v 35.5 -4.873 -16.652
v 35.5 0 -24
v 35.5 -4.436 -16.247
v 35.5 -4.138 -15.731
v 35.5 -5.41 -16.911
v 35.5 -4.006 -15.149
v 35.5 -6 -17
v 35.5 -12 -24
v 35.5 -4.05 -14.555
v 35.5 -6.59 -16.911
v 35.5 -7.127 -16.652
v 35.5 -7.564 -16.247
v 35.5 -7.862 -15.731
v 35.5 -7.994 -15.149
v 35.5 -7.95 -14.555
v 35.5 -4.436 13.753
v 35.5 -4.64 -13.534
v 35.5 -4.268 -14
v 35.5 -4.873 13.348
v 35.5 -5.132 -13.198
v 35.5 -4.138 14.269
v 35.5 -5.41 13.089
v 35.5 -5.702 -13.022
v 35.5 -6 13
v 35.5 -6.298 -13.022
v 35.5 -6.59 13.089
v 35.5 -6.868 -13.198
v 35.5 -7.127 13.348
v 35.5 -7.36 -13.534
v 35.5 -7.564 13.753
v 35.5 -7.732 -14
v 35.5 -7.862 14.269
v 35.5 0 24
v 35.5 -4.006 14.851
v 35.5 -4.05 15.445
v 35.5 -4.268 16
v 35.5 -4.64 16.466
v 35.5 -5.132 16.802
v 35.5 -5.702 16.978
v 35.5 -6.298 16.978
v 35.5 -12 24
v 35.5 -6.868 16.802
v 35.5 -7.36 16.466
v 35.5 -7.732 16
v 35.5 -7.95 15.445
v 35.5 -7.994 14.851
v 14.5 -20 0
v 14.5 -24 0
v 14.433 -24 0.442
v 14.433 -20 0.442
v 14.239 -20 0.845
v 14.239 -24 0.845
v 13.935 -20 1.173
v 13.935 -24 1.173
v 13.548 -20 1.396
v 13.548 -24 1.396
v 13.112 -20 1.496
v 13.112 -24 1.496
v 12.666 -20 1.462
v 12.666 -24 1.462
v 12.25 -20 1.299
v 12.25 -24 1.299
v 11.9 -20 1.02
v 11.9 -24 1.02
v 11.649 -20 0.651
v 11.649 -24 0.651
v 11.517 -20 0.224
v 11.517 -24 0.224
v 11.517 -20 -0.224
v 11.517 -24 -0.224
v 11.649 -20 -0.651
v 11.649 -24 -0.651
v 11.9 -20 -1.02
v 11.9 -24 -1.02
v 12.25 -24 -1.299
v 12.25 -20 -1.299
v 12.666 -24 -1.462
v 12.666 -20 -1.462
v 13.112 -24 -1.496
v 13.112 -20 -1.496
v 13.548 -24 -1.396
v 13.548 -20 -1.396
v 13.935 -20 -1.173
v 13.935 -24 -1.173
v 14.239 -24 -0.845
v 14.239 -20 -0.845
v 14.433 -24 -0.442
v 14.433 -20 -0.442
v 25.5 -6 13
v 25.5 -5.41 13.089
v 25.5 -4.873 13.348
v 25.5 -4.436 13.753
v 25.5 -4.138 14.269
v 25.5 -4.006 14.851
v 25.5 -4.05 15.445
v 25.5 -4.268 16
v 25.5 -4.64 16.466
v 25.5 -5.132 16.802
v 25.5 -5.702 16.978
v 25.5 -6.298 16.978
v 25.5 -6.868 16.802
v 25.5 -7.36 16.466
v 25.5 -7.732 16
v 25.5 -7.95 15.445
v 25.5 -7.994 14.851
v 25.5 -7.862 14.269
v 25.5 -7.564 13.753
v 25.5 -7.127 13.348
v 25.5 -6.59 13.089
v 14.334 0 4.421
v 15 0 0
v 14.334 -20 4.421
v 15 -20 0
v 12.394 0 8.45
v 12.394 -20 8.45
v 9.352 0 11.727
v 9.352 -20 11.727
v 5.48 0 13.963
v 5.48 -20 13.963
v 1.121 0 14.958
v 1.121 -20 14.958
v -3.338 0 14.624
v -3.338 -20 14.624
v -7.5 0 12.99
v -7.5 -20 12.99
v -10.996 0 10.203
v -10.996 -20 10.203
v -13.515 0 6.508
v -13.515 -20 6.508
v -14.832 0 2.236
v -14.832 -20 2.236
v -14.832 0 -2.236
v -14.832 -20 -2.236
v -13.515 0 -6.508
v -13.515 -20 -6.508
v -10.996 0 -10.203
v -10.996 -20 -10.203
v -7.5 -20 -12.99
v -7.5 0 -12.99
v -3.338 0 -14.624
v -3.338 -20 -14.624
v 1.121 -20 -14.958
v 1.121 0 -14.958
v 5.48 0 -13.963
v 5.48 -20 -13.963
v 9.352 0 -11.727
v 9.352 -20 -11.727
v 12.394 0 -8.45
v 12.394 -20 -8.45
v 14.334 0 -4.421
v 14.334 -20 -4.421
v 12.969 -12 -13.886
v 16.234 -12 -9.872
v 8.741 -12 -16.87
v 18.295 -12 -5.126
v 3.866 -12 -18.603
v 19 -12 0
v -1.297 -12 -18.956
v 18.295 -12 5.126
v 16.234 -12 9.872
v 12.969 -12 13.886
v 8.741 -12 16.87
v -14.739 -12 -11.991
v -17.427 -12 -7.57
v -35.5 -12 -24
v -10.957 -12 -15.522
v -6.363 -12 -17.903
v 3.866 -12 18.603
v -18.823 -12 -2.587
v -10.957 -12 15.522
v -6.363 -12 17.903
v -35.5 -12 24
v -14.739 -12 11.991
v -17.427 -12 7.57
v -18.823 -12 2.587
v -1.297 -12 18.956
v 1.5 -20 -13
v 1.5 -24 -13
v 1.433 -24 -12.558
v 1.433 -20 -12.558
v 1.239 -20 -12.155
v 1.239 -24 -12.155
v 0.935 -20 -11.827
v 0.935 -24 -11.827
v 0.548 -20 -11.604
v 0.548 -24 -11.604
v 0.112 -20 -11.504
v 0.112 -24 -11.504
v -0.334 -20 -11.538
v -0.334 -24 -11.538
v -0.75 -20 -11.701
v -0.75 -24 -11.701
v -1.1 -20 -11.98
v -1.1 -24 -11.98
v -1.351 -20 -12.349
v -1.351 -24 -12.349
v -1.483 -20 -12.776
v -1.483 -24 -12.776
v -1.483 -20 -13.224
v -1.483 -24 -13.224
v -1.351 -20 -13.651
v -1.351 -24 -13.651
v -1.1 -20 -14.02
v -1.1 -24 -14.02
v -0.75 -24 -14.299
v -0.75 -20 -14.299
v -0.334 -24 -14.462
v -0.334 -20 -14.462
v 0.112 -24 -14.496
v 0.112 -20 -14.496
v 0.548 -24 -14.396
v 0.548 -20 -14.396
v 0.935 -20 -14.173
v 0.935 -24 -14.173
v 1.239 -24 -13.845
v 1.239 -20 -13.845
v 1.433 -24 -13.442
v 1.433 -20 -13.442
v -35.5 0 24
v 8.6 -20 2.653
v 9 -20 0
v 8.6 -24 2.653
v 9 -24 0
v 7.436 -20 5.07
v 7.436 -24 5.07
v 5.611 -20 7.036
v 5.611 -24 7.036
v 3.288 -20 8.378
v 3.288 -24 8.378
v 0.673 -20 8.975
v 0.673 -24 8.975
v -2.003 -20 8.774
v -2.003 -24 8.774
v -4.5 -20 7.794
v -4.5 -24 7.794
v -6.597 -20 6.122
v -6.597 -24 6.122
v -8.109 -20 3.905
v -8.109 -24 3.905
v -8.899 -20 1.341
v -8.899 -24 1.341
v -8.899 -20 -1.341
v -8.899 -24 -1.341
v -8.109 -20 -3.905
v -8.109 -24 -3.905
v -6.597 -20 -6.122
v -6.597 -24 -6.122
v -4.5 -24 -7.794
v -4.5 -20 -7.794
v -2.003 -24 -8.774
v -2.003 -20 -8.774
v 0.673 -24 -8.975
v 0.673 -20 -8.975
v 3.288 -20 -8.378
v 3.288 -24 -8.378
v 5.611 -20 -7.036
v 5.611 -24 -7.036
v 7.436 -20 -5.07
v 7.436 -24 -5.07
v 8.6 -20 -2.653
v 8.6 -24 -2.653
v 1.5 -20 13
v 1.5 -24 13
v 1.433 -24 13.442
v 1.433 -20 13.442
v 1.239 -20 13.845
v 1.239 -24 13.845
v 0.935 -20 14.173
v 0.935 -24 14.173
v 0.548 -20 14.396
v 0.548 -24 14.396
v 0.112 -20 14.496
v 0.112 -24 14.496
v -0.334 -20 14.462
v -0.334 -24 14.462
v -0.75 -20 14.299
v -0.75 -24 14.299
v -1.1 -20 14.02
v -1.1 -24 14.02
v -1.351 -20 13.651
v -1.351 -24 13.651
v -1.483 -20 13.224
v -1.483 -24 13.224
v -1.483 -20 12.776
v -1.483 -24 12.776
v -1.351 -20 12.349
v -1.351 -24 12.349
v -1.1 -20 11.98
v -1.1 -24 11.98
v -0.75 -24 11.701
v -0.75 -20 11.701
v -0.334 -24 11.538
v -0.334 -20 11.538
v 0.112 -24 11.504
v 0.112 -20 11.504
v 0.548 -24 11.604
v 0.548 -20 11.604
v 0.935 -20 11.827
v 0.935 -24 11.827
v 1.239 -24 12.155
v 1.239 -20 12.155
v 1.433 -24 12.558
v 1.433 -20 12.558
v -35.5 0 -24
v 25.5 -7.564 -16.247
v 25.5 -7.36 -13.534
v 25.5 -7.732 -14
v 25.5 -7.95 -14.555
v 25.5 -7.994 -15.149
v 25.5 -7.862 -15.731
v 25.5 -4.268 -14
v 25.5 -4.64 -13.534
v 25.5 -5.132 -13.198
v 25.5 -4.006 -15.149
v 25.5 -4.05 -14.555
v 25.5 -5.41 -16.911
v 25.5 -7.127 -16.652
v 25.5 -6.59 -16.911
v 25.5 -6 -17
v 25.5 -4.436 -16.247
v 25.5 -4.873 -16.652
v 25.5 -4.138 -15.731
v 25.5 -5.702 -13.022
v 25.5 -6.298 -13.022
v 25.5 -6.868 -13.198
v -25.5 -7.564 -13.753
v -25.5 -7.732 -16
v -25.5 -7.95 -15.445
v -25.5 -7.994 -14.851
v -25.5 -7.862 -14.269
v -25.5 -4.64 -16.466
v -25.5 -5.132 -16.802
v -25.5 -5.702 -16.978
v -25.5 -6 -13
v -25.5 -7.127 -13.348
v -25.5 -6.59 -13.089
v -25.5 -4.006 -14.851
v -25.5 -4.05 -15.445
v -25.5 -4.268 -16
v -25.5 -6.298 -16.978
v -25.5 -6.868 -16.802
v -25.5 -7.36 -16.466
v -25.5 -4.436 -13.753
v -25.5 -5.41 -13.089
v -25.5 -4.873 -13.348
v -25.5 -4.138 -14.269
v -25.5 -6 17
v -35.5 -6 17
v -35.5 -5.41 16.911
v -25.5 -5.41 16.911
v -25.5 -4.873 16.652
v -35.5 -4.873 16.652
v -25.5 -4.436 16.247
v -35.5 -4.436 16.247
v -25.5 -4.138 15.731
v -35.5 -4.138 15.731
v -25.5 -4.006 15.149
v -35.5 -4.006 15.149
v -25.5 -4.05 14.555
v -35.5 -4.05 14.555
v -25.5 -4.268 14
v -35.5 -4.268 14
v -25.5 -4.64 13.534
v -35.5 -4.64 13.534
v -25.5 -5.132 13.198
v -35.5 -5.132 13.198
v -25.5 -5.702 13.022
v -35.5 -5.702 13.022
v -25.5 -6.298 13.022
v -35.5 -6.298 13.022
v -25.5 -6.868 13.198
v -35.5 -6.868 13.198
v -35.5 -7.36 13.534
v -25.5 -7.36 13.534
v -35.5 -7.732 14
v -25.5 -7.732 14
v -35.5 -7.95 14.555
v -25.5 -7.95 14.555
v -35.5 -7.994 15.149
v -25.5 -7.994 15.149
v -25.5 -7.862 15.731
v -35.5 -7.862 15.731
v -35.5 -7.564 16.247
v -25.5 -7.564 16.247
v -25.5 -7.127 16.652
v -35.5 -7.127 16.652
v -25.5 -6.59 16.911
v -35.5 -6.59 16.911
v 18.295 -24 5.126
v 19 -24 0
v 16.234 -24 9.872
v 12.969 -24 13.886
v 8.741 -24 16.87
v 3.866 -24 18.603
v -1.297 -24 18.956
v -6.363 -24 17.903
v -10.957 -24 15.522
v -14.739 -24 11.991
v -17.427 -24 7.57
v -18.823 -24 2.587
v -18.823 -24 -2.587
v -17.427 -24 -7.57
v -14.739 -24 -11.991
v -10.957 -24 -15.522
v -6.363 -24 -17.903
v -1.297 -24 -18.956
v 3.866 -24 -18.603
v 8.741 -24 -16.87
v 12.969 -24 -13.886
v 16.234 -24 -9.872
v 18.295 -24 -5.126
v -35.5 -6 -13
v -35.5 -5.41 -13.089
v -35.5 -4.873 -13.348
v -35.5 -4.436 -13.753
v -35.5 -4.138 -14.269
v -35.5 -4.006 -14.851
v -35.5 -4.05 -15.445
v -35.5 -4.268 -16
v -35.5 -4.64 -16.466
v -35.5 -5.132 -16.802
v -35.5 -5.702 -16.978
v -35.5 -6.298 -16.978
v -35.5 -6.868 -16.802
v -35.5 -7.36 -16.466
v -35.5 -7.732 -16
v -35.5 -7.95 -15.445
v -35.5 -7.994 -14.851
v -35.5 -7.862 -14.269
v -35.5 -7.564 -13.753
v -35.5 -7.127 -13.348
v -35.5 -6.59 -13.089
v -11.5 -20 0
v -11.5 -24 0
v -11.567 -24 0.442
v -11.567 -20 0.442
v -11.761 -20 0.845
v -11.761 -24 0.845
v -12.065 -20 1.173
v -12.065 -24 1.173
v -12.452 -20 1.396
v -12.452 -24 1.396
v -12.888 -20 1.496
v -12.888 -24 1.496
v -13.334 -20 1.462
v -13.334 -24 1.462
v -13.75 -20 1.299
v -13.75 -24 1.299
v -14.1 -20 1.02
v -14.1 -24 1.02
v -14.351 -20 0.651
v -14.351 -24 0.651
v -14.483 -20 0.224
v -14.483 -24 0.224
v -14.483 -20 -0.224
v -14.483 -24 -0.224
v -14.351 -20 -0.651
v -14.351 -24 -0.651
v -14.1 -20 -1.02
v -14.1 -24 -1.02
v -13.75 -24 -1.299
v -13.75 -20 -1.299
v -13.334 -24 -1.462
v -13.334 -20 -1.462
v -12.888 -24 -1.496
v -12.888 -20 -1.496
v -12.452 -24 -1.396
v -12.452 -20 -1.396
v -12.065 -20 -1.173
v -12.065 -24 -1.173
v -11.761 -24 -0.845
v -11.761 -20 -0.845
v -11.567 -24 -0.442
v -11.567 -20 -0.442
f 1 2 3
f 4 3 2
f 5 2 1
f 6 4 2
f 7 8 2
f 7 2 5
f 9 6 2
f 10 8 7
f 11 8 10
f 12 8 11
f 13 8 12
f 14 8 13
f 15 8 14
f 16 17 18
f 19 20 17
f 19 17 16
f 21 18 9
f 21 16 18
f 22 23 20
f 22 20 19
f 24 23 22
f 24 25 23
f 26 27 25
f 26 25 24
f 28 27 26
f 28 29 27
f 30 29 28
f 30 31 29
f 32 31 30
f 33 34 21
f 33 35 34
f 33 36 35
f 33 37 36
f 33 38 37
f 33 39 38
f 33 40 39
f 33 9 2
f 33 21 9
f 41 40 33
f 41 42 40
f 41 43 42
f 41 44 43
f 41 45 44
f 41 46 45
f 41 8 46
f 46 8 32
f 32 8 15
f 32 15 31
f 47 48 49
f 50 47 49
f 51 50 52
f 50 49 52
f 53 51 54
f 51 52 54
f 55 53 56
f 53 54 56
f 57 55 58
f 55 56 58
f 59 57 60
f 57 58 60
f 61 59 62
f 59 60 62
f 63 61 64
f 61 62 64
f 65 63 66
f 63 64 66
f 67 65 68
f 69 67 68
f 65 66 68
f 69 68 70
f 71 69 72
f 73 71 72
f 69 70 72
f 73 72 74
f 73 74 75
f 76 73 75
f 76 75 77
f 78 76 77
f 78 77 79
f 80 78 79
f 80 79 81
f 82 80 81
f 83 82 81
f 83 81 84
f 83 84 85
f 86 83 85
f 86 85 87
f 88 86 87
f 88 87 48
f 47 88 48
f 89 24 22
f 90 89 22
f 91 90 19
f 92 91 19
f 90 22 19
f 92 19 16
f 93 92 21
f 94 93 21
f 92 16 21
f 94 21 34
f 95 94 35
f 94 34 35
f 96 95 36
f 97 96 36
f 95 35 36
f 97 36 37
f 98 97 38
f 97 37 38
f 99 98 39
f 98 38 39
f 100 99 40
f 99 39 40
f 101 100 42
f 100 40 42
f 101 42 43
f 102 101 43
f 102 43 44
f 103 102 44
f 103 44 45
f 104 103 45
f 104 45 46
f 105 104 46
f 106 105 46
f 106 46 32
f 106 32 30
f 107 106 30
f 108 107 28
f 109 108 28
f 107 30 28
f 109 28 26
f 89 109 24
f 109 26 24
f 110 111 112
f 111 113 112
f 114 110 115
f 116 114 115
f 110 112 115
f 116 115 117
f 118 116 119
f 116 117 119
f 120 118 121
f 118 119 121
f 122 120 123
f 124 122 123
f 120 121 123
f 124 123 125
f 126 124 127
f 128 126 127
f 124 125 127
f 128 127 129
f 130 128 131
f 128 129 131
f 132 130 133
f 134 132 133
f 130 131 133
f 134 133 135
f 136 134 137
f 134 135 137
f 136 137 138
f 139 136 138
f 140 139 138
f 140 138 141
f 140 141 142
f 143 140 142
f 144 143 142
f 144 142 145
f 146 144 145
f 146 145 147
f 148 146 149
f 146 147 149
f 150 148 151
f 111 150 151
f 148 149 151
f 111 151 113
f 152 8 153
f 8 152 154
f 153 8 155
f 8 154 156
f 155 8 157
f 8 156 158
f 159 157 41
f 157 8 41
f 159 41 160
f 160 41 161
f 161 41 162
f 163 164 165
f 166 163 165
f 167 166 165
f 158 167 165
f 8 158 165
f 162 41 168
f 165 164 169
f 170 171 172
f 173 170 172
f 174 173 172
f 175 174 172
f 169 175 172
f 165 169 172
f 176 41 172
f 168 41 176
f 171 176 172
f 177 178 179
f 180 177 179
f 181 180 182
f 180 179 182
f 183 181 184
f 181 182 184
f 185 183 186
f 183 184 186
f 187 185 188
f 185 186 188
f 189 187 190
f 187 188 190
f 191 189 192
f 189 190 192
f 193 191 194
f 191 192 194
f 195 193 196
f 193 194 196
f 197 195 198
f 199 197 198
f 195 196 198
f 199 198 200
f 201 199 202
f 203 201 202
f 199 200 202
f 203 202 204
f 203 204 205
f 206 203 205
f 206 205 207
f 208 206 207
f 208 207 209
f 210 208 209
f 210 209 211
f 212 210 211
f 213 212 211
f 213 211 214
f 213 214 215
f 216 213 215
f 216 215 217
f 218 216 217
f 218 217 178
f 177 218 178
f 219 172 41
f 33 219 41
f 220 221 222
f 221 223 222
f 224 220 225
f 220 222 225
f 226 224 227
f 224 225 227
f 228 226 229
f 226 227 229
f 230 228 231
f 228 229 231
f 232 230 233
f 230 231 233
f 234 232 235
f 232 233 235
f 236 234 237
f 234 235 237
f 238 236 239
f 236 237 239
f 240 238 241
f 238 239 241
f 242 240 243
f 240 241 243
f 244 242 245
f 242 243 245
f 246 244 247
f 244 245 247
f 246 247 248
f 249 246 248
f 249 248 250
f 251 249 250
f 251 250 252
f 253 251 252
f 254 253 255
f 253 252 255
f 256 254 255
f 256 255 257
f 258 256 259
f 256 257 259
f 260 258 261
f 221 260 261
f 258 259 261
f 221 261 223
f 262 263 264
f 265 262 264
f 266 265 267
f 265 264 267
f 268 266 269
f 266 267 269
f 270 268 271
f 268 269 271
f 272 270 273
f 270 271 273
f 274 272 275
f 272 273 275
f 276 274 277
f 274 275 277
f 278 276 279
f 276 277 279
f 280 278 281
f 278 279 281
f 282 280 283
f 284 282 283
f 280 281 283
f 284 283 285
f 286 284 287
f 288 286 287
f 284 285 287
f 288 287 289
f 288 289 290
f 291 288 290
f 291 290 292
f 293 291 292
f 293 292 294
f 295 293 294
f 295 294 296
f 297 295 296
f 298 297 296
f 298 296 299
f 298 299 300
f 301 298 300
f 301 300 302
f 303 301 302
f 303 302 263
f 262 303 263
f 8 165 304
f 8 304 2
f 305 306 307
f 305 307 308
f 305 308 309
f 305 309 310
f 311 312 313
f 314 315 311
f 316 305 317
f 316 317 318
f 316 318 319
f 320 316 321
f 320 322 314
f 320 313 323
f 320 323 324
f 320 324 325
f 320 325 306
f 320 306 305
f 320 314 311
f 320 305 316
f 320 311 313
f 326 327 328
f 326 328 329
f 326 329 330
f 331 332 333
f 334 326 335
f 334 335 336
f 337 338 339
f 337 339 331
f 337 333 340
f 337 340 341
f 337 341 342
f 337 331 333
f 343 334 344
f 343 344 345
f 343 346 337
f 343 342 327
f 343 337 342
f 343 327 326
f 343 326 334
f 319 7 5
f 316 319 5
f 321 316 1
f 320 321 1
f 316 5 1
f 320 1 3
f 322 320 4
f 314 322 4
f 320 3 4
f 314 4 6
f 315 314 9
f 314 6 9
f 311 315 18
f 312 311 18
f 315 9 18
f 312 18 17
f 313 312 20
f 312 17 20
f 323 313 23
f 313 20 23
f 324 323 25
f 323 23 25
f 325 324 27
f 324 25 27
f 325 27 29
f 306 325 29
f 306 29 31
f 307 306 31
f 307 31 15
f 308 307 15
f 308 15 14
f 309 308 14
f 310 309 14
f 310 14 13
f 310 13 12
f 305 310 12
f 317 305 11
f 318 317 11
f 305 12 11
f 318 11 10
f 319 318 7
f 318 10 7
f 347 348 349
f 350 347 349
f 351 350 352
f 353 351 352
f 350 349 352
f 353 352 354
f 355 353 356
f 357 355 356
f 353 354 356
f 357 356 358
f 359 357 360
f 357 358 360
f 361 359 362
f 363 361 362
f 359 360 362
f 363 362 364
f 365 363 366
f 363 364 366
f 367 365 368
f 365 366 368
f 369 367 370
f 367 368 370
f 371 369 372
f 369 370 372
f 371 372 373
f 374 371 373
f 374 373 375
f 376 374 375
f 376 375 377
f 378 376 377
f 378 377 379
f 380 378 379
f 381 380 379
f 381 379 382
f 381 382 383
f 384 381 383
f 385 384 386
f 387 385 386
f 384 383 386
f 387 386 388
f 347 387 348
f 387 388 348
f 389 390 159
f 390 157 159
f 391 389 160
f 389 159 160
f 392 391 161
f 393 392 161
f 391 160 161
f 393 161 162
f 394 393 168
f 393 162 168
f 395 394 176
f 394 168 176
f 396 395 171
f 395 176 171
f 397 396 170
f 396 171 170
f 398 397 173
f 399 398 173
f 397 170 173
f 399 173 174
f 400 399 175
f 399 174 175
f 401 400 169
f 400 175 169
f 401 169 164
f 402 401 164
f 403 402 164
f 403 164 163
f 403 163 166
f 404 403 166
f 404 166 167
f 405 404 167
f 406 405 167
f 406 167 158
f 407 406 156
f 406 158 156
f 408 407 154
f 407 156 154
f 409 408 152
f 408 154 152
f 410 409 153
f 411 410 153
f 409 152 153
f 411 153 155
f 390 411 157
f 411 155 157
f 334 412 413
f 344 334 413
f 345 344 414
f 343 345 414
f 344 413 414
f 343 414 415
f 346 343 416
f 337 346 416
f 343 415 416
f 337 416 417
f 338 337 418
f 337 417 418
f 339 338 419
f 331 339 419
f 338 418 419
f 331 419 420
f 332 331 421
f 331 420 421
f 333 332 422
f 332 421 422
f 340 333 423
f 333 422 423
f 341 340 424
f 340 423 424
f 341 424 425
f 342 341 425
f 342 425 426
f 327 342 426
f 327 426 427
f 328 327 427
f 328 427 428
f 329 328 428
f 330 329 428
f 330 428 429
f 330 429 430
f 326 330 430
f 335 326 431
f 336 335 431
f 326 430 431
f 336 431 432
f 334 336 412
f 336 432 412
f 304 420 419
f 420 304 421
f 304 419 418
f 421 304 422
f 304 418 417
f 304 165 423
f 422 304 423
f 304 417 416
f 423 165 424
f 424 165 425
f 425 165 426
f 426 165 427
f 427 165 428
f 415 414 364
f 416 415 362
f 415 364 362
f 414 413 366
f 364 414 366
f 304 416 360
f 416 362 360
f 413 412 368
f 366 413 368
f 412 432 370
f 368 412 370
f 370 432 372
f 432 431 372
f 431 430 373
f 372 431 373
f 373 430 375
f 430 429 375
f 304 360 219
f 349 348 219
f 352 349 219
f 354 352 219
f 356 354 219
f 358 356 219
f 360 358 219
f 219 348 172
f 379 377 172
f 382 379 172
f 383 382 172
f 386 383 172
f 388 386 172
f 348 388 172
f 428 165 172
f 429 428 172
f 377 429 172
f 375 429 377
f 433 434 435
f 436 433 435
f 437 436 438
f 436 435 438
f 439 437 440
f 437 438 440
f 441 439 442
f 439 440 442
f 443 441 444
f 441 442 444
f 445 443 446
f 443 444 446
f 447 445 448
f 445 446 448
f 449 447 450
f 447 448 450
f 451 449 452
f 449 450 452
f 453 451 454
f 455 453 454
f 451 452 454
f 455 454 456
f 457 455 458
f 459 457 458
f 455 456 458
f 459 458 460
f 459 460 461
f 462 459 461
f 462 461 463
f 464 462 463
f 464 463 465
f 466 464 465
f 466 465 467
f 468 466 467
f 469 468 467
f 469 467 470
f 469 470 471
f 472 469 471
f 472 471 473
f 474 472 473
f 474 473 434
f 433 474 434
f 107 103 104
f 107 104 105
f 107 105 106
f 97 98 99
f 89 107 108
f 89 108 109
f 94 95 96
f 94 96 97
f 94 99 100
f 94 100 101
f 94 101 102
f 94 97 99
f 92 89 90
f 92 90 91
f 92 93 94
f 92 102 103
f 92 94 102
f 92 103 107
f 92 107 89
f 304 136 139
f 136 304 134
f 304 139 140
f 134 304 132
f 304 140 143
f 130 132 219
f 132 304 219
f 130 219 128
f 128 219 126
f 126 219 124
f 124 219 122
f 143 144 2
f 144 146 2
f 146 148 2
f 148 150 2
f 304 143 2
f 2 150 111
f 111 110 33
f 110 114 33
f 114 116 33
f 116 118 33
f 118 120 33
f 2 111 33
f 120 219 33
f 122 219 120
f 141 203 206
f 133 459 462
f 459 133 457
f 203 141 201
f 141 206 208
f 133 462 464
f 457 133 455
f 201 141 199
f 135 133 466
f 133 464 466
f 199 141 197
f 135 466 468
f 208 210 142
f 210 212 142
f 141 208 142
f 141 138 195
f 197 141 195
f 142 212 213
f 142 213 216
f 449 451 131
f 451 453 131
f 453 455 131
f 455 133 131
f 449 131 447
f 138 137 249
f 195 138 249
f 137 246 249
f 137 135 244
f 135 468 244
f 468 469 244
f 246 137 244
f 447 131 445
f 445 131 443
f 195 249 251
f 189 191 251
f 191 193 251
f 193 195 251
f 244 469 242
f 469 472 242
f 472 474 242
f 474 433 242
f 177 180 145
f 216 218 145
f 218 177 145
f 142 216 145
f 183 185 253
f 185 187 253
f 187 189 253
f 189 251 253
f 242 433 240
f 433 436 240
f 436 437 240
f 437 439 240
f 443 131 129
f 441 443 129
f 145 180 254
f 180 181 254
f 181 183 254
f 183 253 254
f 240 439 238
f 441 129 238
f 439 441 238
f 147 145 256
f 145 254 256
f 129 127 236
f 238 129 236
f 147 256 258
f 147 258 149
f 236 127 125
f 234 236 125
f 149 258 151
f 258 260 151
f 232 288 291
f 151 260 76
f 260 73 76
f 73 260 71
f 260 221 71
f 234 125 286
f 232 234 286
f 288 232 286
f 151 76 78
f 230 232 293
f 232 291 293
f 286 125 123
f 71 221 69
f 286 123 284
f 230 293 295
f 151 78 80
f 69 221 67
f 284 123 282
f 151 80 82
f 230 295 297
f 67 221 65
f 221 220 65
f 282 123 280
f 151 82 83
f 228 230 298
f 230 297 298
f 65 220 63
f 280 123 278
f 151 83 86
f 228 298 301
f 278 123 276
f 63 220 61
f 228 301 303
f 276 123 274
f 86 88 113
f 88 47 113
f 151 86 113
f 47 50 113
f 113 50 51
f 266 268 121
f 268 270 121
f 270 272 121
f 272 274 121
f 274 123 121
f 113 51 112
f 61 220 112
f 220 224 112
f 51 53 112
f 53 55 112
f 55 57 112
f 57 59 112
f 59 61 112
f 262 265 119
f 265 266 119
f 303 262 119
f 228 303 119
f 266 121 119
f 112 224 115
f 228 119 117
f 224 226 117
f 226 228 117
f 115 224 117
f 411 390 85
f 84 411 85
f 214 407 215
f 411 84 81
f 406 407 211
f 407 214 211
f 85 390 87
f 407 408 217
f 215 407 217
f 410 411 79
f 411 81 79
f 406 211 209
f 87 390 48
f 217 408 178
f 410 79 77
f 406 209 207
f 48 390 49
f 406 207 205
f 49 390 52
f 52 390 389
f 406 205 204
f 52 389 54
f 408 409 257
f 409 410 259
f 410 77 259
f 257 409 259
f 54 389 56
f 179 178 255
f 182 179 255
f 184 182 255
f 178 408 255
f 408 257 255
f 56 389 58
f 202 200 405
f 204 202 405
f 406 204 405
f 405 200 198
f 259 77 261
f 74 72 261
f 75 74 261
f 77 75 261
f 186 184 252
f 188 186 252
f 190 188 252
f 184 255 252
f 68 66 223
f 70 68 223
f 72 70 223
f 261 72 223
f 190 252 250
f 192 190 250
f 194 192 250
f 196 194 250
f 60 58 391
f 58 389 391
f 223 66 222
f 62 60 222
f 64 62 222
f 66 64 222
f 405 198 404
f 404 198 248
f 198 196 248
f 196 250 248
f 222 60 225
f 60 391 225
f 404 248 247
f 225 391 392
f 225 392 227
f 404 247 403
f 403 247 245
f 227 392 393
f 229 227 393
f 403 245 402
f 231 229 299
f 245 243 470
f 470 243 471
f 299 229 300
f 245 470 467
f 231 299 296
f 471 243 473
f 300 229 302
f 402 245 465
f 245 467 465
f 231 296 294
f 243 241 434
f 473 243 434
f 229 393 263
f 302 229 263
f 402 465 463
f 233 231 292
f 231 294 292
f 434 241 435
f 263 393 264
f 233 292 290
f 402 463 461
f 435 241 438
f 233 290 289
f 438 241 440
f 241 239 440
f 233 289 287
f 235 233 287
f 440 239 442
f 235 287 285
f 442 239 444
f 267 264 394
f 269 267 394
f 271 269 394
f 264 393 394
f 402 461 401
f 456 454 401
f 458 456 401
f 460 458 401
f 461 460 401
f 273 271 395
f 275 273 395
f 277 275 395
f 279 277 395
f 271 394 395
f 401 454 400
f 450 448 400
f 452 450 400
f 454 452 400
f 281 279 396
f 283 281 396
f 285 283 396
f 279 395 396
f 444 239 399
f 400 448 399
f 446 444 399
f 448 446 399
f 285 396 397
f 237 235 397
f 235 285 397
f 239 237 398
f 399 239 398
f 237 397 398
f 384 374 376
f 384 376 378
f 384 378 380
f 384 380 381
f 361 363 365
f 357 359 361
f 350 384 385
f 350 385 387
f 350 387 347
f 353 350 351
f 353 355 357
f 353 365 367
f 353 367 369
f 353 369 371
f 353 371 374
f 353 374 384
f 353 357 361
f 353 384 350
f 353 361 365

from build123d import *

# Parameters (mm, degrees)
ESQUISSE4_R           = 1.5
EXTRUSION3_DEPTH      = 25
ESQUISSE5_OUTSIDE_W   = 153.718
ESQUISSE5_OUTSIDE_H   = 153.718
ESQUISSE5_OUTSIDE_W_2 = 71
ESQUISSE5_OUTSIDE_H_2 = 48
EXTRUSION4_DEPTH      = 13
ESQUISSE6_R           = 2
EXTRUSION5_DEPTH      = 10
ESQUISSE7_R           = 2
EXTRUSION6_DEPTH      = 10


with BuildPart() as part:
    # Esquisse1 → Révolution1 (revolve)
    with BuildSketch(Plane.XY):
        Polygon((19, -12), (59, -12), (59, 0), (15, 0), (15, -20), (9, -20), (9, -24), (19, -24), align=None)
    revolve(axis=Axis((0, 0, 0), (0, -1, 0)))

    # Esquisse4 → Extrusion3 (cut, through all)
    with BuildSketch(Plane.XZ.offset(24)):
        with Locations((0, 13)):
            Circle(ESQUISSE4_R)
        with Locations((13, 0)):
            Circle(ESQUISSE4_R)
        with Locations((0, -13)):
            Circle(ESQUISSE4_R)
        with Locations((-13, 0)):
            Circle(ESQUISSE4_R)
    extrude(amount=-EXTRUSION3_DEPTH, mode=Mode.SUBTRACT)

    # Esquisse5 outside → Extrusion4 (cut, through all)
    with BuildSketch(Plane.XZ.offset(12)):
        Rectangle(ESQUISSE5_OUTSIDE_W, ESQUISSE5_OUTSIDE_H)
        Rectangle(ESQUISSE5_OUTSIDE_W_2, ESQUISSE5_OUTSIDE_H_2, mode=Mode.SUBTRACT)
    extrude(amount=-EXTRUSION4_DEPTH, mode=Mode.SUBTRACT)

    # Esquisse6 → Extrusion5 (cut)
    with BuildSketch(Plane(origin=(35.5, 0, 0), x_dir=(0, 0, -1), z_dir=(1, 0, 0))):
        with Locations((-15, -6)):
            Circle(ESQUISSE6_R)
        with Locations((15, -6)):
            Circle(ESQUISSE6_R)
    extrude(amount=-EXTRUSION5_DEPTH, mode=Mode.SUBTRACT)

    # Esquisse7 → Extrusion6 (cut)
    with BuildSketch(Plane.ZY.offset(35.5)):
        with Locations((15, -6)):
            Circle(ESQUISSE7_R)
        with Locations((-15, -6)):
            Circle(ESQUISSE7_R)
    extrude(amount=-EXTRUSION6_DEPTH, mode=Mode.SUBTRACT)


solid = part.part
